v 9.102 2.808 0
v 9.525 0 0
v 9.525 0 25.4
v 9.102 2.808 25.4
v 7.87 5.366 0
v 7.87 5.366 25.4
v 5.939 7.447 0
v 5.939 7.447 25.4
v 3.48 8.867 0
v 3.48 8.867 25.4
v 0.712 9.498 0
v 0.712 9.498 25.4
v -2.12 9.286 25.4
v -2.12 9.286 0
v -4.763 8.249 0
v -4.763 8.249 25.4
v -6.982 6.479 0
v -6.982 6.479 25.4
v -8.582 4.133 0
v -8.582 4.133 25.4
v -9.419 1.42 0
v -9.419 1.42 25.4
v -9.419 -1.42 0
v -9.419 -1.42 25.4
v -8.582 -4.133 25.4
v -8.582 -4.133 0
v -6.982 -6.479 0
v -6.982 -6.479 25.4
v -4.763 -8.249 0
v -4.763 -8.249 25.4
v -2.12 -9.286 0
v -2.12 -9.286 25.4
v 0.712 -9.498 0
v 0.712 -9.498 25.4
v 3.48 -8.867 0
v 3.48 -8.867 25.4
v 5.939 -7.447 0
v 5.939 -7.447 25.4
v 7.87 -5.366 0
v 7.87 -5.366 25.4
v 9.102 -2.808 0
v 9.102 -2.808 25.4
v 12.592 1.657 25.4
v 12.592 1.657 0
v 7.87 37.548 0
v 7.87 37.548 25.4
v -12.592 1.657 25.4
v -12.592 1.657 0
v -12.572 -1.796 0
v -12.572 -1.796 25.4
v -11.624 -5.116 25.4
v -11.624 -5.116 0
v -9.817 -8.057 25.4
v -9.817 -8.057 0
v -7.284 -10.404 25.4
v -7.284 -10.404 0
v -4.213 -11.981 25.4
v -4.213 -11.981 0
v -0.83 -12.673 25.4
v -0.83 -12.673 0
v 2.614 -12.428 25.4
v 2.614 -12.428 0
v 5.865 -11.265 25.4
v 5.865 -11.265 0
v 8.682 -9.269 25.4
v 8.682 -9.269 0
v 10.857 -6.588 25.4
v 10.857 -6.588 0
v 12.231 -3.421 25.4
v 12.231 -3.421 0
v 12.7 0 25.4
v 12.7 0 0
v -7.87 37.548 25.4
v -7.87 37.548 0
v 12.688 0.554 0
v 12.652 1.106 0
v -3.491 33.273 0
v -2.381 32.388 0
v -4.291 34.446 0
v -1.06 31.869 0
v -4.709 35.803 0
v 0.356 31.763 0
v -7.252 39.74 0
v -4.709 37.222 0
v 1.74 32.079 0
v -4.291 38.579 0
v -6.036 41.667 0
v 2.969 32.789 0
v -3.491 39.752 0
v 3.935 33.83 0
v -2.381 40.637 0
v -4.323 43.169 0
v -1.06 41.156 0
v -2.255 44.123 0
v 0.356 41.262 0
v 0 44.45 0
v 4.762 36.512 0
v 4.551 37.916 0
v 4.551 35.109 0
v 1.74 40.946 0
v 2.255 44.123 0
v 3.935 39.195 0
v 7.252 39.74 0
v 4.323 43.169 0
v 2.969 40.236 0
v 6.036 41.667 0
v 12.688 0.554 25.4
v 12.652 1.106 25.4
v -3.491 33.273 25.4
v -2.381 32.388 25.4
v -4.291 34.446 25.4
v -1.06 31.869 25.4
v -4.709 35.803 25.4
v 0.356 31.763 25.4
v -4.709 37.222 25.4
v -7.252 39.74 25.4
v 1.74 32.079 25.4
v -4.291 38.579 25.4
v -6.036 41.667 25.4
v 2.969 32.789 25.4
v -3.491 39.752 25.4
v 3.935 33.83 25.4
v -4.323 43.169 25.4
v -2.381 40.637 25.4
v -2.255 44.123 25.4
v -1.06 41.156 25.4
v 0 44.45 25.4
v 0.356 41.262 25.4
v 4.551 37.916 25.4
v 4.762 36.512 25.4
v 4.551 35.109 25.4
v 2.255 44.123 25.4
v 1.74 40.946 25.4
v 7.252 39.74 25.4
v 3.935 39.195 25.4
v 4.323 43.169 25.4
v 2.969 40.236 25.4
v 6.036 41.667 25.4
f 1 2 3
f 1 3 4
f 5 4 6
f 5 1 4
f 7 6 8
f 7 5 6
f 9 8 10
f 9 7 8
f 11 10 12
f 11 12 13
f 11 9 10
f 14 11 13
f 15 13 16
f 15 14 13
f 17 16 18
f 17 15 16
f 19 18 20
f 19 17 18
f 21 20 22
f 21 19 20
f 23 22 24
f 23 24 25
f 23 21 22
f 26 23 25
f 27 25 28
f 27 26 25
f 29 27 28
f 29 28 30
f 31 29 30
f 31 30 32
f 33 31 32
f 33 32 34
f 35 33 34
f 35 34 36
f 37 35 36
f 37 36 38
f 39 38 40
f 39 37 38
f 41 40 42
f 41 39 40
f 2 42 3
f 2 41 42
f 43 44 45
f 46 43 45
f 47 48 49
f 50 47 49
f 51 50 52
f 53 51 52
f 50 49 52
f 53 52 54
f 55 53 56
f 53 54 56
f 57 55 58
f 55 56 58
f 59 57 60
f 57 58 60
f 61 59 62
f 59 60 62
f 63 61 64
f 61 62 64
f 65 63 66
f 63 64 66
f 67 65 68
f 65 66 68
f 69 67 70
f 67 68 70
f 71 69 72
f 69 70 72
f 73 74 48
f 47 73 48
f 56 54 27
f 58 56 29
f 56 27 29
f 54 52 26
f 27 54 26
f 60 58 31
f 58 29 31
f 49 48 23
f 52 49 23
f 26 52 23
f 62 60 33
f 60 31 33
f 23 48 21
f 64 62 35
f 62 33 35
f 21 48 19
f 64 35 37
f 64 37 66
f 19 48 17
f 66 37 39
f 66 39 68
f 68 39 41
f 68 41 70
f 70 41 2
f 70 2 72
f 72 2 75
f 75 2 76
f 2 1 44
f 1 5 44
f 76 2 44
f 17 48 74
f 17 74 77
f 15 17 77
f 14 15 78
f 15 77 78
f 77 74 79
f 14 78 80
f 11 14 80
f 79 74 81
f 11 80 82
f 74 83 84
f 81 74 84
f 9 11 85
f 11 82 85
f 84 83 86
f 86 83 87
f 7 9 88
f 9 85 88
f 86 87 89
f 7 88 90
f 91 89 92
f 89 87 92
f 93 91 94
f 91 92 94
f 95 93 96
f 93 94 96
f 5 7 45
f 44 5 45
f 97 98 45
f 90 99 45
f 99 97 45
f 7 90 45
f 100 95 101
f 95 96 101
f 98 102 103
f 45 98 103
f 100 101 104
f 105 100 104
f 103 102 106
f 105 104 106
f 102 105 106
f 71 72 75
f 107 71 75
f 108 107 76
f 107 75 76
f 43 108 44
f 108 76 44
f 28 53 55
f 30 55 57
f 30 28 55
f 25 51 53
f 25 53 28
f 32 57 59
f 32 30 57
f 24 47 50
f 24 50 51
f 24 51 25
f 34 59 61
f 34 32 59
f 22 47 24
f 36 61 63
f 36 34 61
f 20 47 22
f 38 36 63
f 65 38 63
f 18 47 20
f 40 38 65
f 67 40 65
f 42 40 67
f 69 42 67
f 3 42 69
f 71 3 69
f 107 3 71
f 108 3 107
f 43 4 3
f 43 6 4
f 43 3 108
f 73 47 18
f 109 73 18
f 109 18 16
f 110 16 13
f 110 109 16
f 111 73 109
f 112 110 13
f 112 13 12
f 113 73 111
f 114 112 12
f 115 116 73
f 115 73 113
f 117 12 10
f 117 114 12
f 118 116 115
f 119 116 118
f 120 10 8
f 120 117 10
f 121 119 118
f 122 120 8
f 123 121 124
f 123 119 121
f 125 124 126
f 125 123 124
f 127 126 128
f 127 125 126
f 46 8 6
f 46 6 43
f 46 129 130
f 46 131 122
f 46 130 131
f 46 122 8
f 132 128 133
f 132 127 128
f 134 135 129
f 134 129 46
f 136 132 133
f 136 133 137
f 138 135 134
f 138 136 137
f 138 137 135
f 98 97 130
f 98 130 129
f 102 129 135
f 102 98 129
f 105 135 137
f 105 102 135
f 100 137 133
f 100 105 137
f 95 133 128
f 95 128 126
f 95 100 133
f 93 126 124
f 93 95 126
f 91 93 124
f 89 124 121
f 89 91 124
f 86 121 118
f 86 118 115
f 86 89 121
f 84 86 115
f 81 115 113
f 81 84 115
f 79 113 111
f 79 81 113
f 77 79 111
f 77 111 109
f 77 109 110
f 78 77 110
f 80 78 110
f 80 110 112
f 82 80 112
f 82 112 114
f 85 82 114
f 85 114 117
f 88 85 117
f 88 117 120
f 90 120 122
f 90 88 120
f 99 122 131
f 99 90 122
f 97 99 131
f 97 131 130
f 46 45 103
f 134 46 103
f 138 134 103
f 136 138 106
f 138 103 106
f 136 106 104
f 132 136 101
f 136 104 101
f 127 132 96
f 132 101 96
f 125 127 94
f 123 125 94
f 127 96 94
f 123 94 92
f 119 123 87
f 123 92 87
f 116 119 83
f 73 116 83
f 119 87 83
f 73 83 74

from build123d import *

# Parameters (mm, degrees)
F0_R     = 9.525
F0_R_2   = 4.7625
F1_DEPTH = 25.4


with BuildPart() as f1:
    # F0 (on Top) → F1 (new body)
    with BuildSketch(Plane.XY):
        with BuildLine():
            ThreePointArc((-12.591503, 1.656522), (-0.830036, -12.672847), (12.7, 0))
            ThreePointArc((12.7, 0), (12.672847, 0.830036), (12.591503, 1.656522))
            ThreePointArc((12.591503, 1.656522), (0, 12.7), (-12.591503, 1.656522))
        make_face()
        Circle(F0_R, mode=Mode.SUBTRACT)
        with BuildLine():
            ThreePointArc((-12.591503, 1.656522), (0, 12.7), (12.591503, 1.656522))
            Line((12.591503, 1.656522), (7.869689, 37.547826))
            ThreePointArc((7.869689, 37.547826), (7.920529, 37.031272), (7.9375, 36.5125))
            ThreePointArc((7.9375, 36.5125), (-0.518772, 28.591971), (-7.869689, 37.547826))
            Line((-7.869689, 37.547826), (-12.591503, 1.656522))
        make_face()
        with BuildLine():
            ThreePointArc((7.9375, 36.5125), (7.920529, 37.031272), (7.869689, 37.547826))
            ThreePointArc((7.869689, 37.547826), (0, 44.45), (-7.869689, 37.547826))
            ThreePointArc((-7.869689, 37.547826), (-0.518772, 28.591971), (7.9375, 36.5125))
        make_face()
        with Locations((0, 36.5125)):
            Circle(F0_R_2, mode=Mode.SUBTRACT)
    extrude(amount=F1_DEPTH)


solid = f1.part
